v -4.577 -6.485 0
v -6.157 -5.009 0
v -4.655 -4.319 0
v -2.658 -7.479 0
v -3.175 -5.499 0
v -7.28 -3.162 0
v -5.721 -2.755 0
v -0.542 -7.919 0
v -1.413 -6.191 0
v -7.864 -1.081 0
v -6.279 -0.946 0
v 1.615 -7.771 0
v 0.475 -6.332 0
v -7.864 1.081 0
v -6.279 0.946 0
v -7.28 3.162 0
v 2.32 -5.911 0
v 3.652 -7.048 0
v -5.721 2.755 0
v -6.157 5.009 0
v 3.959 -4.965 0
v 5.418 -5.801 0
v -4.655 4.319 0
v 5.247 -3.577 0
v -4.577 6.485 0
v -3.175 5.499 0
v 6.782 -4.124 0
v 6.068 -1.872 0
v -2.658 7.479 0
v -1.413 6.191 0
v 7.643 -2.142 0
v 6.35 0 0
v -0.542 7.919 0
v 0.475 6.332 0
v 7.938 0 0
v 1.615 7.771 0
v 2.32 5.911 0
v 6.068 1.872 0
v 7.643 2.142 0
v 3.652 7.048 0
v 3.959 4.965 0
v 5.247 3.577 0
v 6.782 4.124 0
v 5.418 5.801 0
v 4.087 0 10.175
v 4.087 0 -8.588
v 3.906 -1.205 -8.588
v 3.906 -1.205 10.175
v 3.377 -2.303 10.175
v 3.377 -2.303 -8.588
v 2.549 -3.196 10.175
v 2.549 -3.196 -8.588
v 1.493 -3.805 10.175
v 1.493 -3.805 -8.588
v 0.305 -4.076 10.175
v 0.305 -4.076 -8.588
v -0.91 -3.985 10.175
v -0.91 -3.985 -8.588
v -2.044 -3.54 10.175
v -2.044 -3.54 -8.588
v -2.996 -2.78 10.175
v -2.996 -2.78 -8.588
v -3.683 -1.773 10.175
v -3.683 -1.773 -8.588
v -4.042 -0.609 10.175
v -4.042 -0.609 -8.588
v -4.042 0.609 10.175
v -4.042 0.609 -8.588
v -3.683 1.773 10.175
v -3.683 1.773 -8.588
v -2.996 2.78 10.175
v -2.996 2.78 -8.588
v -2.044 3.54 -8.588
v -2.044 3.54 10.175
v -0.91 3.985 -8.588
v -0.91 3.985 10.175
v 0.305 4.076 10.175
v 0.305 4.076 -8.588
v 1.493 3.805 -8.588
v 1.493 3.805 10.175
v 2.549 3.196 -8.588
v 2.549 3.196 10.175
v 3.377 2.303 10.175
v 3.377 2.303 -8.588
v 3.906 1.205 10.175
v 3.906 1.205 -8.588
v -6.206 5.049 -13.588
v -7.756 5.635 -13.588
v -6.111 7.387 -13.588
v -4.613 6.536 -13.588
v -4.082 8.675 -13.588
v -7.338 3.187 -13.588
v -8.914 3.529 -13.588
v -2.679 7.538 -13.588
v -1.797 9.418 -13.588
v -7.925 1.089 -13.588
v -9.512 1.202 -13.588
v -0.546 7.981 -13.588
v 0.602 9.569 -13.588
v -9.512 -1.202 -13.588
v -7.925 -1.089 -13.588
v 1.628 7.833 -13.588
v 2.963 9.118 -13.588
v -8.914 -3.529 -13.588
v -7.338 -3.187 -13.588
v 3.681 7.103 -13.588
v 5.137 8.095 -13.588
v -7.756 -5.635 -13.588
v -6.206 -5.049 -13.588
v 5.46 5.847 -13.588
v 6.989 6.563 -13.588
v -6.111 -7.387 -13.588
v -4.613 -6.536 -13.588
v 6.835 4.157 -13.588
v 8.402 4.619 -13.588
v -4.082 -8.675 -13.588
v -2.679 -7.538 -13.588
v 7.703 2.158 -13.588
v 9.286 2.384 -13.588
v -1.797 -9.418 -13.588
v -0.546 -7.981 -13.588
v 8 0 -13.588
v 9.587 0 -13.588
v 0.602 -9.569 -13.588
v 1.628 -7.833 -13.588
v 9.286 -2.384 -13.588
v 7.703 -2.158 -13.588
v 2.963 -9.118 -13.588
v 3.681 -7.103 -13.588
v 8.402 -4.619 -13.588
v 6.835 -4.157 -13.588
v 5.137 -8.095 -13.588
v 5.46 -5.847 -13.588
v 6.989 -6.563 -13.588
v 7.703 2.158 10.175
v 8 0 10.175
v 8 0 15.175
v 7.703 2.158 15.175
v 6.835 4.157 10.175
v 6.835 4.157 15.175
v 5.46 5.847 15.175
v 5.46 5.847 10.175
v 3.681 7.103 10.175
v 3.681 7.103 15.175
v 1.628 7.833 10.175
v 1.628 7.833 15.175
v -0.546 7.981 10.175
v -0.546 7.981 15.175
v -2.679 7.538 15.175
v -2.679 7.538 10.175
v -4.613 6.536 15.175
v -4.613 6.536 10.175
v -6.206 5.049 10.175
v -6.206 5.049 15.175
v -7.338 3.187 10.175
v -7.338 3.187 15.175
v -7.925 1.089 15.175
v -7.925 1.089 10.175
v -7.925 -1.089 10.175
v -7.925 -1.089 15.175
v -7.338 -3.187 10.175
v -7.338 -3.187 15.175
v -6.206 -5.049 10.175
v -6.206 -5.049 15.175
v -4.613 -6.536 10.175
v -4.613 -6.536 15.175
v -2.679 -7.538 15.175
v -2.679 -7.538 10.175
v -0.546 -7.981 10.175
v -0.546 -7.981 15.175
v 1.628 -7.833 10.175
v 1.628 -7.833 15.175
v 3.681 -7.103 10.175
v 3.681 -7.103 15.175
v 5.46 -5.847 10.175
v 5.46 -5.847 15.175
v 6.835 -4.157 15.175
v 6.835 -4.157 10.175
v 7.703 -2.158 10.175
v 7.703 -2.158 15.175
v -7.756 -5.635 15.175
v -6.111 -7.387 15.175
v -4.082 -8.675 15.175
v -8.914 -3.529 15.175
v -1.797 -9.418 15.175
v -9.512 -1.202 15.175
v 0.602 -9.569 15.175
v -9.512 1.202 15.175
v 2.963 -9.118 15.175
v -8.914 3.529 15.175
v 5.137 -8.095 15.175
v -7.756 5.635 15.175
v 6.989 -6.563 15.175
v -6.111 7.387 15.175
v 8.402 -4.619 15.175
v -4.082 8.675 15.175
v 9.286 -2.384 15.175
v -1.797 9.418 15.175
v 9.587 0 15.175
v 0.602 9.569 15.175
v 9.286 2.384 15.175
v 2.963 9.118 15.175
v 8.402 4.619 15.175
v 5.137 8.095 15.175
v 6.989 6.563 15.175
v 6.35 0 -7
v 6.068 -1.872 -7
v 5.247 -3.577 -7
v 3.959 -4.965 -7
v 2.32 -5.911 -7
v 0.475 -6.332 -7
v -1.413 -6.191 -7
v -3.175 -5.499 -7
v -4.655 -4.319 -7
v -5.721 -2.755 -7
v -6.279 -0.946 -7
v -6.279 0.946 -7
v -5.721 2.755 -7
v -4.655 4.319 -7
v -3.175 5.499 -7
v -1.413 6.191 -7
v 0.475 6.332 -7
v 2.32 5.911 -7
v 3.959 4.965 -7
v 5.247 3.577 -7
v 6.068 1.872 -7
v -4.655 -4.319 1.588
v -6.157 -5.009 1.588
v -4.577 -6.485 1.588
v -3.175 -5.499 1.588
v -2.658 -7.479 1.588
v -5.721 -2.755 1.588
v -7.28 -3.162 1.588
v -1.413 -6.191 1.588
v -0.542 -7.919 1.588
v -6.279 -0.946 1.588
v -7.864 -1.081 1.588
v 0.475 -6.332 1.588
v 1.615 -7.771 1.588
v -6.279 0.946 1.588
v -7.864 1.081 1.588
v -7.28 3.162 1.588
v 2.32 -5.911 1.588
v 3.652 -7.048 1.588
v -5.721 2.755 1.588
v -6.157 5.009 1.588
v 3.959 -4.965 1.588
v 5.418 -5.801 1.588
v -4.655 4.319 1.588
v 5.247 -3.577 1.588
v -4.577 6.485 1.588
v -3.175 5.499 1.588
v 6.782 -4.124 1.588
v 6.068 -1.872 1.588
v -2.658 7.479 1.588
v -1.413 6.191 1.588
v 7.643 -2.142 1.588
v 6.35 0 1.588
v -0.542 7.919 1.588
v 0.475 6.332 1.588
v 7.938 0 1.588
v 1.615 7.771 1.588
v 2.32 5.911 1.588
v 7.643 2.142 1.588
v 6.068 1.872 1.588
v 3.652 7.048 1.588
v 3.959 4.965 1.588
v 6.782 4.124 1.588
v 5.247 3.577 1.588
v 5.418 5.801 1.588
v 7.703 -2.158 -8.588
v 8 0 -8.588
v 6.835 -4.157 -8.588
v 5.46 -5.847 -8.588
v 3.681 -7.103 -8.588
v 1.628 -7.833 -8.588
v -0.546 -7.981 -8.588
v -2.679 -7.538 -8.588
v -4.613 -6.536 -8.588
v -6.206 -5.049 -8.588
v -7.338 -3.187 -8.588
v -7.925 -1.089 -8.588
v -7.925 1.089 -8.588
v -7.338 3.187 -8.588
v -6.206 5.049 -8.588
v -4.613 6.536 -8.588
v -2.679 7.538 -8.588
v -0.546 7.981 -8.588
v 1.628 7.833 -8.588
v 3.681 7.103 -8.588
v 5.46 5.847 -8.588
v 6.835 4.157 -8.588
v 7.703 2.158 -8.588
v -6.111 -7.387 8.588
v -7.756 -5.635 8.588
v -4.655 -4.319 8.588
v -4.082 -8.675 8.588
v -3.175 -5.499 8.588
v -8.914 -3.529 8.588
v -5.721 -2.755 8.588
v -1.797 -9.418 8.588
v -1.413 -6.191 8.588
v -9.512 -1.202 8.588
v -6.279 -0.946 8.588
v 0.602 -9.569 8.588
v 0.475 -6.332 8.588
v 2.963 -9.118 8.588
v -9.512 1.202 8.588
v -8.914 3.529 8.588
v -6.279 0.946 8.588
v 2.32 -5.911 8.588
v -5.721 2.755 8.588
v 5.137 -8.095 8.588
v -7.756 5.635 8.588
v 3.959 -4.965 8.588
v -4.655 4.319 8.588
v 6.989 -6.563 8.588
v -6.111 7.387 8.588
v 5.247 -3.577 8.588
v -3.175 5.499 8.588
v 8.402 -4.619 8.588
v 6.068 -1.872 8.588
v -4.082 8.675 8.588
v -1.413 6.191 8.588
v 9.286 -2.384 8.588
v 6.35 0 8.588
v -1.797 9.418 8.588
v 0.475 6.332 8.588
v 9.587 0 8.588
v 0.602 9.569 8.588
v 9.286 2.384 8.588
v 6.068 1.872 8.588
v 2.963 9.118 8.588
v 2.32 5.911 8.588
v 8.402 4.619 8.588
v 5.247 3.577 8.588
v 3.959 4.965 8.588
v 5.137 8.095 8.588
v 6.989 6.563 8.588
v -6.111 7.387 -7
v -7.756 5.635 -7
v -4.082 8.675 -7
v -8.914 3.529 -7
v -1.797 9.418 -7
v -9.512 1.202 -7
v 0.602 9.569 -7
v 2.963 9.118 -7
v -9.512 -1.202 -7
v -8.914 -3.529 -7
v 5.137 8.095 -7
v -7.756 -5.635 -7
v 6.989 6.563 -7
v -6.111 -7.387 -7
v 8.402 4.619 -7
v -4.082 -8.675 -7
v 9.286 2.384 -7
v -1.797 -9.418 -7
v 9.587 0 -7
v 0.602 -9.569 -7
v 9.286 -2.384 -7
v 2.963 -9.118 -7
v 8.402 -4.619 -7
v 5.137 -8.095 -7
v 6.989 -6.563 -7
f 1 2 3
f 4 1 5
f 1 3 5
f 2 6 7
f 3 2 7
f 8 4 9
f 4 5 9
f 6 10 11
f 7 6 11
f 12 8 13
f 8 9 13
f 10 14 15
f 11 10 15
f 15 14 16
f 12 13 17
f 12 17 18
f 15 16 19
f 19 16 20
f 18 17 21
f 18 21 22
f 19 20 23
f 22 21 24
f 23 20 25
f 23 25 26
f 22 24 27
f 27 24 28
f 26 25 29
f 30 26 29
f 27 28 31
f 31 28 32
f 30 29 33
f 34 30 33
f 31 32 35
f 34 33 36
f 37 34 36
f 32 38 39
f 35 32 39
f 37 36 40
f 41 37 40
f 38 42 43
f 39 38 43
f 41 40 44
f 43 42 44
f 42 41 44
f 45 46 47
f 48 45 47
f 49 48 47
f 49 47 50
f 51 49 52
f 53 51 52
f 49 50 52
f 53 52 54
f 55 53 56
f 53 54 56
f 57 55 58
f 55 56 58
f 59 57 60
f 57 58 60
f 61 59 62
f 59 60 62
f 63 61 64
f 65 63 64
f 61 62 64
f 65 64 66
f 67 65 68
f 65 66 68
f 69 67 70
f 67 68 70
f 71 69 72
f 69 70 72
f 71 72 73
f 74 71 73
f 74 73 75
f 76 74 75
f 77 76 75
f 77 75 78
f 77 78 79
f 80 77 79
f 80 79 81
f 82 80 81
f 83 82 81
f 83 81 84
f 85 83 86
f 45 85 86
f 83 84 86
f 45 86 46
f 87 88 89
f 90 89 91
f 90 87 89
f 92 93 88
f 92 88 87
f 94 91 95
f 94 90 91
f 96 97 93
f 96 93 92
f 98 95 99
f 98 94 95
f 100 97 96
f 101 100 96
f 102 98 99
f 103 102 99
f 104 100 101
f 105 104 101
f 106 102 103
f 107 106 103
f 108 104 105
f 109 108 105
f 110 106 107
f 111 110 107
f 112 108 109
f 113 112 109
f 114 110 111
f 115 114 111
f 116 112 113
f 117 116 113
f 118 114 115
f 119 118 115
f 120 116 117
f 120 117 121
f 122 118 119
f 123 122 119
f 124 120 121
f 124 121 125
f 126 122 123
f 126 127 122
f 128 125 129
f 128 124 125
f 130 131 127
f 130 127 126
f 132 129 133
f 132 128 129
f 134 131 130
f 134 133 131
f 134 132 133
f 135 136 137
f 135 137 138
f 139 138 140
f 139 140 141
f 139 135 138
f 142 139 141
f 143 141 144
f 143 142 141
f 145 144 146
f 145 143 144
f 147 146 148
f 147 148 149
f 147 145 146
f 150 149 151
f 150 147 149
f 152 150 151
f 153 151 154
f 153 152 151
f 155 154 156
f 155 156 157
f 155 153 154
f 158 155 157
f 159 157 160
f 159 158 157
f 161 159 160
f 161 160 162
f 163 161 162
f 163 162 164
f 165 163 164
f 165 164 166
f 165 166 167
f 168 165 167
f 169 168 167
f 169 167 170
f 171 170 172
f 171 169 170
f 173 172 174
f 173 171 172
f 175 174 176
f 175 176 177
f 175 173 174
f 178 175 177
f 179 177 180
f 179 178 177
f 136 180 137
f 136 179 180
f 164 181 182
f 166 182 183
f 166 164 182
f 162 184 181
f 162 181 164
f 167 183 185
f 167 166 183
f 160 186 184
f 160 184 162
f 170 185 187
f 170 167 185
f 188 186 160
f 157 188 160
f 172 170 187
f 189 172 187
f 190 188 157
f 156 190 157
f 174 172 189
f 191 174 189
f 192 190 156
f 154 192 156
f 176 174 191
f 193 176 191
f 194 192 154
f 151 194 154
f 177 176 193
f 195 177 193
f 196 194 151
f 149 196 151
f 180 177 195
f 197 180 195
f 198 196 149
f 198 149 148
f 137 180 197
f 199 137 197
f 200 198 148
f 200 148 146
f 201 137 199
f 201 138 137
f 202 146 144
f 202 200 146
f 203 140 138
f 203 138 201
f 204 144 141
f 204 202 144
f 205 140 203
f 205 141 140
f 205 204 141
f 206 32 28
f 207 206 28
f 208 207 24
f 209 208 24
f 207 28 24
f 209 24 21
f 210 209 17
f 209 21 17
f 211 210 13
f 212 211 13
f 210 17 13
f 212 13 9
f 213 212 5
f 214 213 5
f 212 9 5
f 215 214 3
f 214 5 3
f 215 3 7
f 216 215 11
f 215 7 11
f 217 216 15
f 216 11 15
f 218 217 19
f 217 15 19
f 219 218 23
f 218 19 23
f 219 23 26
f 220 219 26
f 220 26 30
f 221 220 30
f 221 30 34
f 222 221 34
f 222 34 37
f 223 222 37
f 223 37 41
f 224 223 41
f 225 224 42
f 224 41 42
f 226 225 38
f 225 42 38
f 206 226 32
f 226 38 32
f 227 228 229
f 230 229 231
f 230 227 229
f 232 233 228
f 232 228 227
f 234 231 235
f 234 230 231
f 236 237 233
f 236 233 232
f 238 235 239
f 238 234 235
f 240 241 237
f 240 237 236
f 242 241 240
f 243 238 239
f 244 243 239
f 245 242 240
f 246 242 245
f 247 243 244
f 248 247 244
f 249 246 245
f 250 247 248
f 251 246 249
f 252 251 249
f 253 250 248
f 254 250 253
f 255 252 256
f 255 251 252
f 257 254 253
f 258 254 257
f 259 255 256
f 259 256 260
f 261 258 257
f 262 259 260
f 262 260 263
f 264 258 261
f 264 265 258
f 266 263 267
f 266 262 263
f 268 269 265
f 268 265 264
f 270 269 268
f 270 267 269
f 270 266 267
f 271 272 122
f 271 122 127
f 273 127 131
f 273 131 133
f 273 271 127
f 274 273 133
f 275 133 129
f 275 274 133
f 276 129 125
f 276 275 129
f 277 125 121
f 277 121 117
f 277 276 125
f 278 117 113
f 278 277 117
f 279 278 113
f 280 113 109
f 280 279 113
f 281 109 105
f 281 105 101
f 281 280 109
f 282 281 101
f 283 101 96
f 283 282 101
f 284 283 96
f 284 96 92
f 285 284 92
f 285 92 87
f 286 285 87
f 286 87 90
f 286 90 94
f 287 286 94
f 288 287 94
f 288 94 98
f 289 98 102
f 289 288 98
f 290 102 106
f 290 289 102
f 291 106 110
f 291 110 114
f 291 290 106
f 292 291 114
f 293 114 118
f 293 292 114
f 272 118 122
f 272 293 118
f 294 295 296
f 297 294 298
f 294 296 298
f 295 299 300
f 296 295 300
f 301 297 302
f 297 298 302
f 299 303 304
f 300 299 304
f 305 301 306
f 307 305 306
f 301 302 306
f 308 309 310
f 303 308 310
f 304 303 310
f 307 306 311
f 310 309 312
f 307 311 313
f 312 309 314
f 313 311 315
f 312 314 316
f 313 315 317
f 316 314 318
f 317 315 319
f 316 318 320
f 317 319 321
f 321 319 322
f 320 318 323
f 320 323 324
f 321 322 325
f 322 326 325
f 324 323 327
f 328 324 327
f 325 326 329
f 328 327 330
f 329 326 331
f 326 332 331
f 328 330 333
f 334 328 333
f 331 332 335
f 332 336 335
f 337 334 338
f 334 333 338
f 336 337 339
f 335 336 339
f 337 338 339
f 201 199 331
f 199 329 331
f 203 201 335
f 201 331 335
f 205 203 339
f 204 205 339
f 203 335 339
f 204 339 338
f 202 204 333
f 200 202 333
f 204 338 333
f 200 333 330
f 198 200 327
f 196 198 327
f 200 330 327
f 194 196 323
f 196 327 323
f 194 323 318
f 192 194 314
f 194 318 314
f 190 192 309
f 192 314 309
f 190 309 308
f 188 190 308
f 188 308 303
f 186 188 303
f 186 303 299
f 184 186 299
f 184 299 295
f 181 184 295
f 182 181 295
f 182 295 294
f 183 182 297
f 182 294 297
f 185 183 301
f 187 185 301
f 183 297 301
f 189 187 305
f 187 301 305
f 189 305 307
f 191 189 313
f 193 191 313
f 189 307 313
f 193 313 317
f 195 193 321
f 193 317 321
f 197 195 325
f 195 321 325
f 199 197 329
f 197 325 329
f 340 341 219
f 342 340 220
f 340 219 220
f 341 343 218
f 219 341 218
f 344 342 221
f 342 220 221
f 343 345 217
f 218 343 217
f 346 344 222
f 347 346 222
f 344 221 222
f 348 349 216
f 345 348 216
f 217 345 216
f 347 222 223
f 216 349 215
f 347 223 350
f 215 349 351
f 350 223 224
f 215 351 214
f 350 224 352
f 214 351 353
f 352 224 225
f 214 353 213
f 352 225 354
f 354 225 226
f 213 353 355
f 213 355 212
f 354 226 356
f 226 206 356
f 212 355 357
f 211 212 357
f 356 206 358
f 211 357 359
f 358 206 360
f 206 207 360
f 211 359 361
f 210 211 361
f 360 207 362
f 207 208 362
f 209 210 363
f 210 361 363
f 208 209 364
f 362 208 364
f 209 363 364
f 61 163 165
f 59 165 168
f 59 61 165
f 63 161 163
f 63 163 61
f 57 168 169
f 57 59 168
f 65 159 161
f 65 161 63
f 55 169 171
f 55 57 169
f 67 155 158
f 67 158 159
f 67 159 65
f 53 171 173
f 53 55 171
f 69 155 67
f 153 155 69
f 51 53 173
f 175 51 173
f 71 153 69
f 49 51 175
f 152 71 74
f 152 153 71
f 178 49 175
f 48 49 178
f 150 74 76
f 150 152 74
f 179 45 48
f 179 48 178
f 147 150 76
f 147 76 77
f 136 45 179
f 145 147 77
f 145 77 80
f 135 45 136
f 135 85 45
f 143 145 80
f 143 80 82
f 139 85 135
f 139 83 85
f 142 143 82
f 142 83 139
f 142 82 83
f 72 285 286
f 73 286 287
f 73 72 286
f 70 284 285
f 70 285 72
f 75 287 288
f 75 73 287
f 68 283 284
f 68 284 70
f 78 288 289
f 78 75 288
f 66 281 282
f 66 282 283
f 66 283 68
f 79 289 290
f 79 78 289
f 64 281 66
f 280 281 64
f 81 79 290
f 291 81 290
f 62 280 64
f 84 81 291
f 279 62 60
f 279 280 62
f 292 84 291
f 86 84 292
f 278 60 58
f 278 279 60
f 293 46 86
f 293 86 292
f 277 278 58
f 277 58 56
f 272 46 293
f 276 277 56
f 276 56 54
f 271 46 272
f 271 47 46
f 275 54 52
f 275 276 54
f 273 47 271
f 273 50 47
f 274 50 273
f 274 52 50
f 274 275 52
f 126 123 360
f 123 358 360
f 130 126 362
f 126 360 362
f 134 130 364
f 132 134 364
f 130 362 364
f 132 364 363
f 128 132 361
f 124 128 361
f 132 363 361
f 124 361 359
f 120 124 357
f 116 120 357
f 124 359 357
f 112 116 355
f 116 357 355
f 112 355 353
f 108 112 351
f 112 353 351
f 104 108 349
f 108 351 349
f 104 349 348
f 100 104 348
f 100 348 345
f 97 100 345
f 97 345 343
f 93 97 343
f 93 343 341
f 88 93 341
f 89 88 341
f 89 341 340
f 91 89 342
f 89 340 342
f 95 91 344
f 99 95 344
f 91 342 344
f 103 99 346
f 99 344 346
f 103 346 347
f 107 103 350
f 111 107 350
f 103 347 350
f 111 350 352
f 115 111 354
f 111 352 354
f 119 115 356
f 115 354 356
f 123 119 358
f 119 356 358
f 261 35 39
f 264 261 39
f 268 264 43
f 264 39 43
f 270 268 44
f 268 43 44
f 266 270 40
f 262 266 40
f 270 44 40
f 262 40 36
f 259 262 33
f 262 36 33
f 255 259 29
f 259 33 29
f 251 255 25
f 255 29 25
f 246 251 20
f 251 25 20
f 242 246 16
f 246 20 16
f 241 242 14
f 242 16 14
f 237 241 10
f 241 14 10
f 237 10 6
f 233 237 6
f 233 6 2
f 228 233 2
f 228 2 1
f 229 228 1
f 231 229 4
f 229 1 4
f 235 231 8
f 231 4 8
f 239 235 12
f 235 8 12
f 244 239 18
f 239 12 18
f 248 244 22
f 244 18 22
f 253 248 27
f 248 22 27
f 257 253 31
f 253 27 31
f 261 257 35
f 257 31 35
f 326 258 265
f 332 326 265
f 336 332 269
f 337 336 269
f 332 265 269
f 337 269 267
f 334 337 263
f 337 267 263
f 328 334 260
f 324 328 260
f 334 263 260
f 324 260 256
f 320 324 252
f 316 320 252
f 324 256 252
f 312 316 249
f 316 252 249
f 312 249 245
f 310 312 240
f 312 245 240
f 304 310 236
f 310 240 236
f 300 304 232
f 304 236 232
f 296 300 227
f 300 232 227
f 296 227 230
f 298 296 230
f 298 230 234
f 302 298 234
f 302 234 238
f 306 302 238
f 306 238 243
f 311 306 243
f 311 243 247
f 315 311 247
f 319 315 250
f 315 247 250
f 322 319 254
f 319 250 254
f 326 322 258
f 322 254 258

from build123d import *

# Parameters (mm, degrees)
F0_R      = 7.9375
F1_DEPTH  = 1.5875
F2_R      = 6.35
F3_DEPTH  = 7
F4_R      = 6.35
F5_DEPTH  = 7
F6_R      = 9.587497
F7_DEPTH  = 1.5875
F8_R      = 9.587497
F9_DEPTH  = 1.5875
F10_R     = 9.587497
F10_R_2   = 8
F11_DEPTH = 5
F12_R     = 9.587497
F12_R_2   = 8
F13_DEPTH = 5
F14_R     = 4.087495
F15_DEPTH = 18.7625


with BuildPart() as f1:
    # F0 (on Top) → F1 (new body)
    with BuildSketch(Plane.XY):
        Circle(F0_R)
    extrude(amount=F1_DEPTH)

    # F2 (on face) → F3 (join)
    with BuildSketch(Plane.XY.offset(1.5875)):
        Circle(F2_R)
    extrude(amount=F3_DEPTH)

    # F4 (on face) → F5 (join)
    with BuildSketch(Plane(origin=(0, 0, 0), x_dir=(1, 0, 0), z_dir=(0, 0, -1))):
        Circle(F4_R)
    extrude(amount=F5_DEPTH)

    # F6 (on face) → F7 (join)
    with BuildSketch(Plane.XY.offset(8.5875)):
        Circle(F6_R)
    extrude(amount=F7_DEPTH)

    # F8 (on face) → F9 (join)
    with BuildSketch(Plane(origin=(0, 0, -7), x_dir=(1, 0, 0), z_dir=(0, 0, -1))):
        Circle(F8_R)
    extrude(amount=F9_DEPTH)

    # F10 (on face) → F11 (join)
    with BuildSketch(Plane(origin=(0, 0, -8.5875), x_dir=(1, 0, 0), z_dir=(0, 0, -1))):
        Circle(F10_R)
        Circle(F10_R_2, mode=Mode.SUBTRACT)
    extrude(amount=F11_DEPTH)

    # F12 (on face) → F13 (join)
    with BuildSketch(Plane.XY.offset(10.175)):
        Circle(F12_R)
        Circle(F12_R_2, mode=Mode.SUBTRACT)
    extrude(amount=F13_DEPTH)

    # F14 (on face) → F15 (cut, through all)
    with BuildSketch(Plane(origin=(0, 0, -8.5875), x_dir=(1, 0, 0), z_dir=(0, 0, -1))):
        Circle(F14_R)
    extrude(amount=-F15_DEPTH, mode=Mode.SUBTRACT)


solid = f1.part
